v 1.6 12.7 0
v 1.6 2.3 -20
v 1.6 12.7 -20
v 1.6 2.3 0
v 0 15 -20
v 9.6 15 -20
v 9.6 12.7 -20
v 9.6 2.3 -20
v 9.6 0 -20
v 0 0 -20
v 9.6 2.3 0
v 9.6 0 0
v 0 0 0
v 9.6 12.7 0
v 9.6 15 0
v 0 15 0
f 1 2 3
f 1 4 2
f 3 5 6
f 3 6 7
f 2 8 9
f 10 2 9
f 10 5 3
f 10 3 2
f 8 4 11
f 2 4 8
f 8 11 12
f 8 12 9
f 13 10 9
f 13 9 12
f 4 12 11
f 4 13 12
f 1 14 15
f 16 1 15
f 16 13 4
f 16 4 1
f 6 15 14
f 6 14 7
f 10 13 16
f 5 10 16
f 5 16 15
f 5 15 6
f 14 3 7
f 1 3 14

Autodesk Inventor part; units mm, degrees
ref_plane "YZ Plane" through (0, 0, 0) normal (1, 0, 0) x (0, 1, 0)
ref_plane "XZ Plane" through (0, 0, 0) normal (0, 1, 0) x (-1, 0, 0)
ref_plane "XY Plane" through (0, 0, 0) normal (0, 0, 1) x (1, 0, 0)
sketch "Sketch1" plane through (0, 0, 0) normal (1, 0, 0) x (0, 1, 0)
  line L0 (0, 0) -> (15, 0)
  line L1 (15, 0) -> (15, -20)
  line L2 (15, -20) -> (0, -20)
  line L3 (0, -20) -> (0, 0)
  dimension "d0" = 15
  dimension "d1" = 20
extrude "Extrusion1" add sketch "Sketch1" along normal blind 1.6
sketch "Sketch2" plane through (1.6, 0, 0) normal (1, 0, 0) x (0, 0, -1)
  line L0 (0, 15) -> (0, 0) projected
  line L1 (0, 0) -> (20, 0) projected
  line L2 (20, 0) -> (20, 15) projected
  line L3 (20, 15) -> (0, 15) projected
  line L4 (0, 15) -> (20, 15)
  line L5 (20, 15) -> (20, 12.7)
  line L6 (20, 12.7) -> (0, 12.7)
  line L7 (0, 12.7) -> (0, 15)
  line L8 (20, 0) -> (0, 0)
  line L9 (0, 0) -> (0, 2.3)
  line L10 (0, 2.3) -> (20, 2.3)
  line L11 (20, 2.3) -> (20, 0)
  dimension "d4" = 2.3
  dimension "d5" = 2.3
extrude "Extrusion2" add sketch "Sketch2" along normal blind 8 contours L3 L2 L6 L0 | L10 L2 L1 L0
equation "\"d5\" = d4"
properties part number "StepperDriverA4988"
